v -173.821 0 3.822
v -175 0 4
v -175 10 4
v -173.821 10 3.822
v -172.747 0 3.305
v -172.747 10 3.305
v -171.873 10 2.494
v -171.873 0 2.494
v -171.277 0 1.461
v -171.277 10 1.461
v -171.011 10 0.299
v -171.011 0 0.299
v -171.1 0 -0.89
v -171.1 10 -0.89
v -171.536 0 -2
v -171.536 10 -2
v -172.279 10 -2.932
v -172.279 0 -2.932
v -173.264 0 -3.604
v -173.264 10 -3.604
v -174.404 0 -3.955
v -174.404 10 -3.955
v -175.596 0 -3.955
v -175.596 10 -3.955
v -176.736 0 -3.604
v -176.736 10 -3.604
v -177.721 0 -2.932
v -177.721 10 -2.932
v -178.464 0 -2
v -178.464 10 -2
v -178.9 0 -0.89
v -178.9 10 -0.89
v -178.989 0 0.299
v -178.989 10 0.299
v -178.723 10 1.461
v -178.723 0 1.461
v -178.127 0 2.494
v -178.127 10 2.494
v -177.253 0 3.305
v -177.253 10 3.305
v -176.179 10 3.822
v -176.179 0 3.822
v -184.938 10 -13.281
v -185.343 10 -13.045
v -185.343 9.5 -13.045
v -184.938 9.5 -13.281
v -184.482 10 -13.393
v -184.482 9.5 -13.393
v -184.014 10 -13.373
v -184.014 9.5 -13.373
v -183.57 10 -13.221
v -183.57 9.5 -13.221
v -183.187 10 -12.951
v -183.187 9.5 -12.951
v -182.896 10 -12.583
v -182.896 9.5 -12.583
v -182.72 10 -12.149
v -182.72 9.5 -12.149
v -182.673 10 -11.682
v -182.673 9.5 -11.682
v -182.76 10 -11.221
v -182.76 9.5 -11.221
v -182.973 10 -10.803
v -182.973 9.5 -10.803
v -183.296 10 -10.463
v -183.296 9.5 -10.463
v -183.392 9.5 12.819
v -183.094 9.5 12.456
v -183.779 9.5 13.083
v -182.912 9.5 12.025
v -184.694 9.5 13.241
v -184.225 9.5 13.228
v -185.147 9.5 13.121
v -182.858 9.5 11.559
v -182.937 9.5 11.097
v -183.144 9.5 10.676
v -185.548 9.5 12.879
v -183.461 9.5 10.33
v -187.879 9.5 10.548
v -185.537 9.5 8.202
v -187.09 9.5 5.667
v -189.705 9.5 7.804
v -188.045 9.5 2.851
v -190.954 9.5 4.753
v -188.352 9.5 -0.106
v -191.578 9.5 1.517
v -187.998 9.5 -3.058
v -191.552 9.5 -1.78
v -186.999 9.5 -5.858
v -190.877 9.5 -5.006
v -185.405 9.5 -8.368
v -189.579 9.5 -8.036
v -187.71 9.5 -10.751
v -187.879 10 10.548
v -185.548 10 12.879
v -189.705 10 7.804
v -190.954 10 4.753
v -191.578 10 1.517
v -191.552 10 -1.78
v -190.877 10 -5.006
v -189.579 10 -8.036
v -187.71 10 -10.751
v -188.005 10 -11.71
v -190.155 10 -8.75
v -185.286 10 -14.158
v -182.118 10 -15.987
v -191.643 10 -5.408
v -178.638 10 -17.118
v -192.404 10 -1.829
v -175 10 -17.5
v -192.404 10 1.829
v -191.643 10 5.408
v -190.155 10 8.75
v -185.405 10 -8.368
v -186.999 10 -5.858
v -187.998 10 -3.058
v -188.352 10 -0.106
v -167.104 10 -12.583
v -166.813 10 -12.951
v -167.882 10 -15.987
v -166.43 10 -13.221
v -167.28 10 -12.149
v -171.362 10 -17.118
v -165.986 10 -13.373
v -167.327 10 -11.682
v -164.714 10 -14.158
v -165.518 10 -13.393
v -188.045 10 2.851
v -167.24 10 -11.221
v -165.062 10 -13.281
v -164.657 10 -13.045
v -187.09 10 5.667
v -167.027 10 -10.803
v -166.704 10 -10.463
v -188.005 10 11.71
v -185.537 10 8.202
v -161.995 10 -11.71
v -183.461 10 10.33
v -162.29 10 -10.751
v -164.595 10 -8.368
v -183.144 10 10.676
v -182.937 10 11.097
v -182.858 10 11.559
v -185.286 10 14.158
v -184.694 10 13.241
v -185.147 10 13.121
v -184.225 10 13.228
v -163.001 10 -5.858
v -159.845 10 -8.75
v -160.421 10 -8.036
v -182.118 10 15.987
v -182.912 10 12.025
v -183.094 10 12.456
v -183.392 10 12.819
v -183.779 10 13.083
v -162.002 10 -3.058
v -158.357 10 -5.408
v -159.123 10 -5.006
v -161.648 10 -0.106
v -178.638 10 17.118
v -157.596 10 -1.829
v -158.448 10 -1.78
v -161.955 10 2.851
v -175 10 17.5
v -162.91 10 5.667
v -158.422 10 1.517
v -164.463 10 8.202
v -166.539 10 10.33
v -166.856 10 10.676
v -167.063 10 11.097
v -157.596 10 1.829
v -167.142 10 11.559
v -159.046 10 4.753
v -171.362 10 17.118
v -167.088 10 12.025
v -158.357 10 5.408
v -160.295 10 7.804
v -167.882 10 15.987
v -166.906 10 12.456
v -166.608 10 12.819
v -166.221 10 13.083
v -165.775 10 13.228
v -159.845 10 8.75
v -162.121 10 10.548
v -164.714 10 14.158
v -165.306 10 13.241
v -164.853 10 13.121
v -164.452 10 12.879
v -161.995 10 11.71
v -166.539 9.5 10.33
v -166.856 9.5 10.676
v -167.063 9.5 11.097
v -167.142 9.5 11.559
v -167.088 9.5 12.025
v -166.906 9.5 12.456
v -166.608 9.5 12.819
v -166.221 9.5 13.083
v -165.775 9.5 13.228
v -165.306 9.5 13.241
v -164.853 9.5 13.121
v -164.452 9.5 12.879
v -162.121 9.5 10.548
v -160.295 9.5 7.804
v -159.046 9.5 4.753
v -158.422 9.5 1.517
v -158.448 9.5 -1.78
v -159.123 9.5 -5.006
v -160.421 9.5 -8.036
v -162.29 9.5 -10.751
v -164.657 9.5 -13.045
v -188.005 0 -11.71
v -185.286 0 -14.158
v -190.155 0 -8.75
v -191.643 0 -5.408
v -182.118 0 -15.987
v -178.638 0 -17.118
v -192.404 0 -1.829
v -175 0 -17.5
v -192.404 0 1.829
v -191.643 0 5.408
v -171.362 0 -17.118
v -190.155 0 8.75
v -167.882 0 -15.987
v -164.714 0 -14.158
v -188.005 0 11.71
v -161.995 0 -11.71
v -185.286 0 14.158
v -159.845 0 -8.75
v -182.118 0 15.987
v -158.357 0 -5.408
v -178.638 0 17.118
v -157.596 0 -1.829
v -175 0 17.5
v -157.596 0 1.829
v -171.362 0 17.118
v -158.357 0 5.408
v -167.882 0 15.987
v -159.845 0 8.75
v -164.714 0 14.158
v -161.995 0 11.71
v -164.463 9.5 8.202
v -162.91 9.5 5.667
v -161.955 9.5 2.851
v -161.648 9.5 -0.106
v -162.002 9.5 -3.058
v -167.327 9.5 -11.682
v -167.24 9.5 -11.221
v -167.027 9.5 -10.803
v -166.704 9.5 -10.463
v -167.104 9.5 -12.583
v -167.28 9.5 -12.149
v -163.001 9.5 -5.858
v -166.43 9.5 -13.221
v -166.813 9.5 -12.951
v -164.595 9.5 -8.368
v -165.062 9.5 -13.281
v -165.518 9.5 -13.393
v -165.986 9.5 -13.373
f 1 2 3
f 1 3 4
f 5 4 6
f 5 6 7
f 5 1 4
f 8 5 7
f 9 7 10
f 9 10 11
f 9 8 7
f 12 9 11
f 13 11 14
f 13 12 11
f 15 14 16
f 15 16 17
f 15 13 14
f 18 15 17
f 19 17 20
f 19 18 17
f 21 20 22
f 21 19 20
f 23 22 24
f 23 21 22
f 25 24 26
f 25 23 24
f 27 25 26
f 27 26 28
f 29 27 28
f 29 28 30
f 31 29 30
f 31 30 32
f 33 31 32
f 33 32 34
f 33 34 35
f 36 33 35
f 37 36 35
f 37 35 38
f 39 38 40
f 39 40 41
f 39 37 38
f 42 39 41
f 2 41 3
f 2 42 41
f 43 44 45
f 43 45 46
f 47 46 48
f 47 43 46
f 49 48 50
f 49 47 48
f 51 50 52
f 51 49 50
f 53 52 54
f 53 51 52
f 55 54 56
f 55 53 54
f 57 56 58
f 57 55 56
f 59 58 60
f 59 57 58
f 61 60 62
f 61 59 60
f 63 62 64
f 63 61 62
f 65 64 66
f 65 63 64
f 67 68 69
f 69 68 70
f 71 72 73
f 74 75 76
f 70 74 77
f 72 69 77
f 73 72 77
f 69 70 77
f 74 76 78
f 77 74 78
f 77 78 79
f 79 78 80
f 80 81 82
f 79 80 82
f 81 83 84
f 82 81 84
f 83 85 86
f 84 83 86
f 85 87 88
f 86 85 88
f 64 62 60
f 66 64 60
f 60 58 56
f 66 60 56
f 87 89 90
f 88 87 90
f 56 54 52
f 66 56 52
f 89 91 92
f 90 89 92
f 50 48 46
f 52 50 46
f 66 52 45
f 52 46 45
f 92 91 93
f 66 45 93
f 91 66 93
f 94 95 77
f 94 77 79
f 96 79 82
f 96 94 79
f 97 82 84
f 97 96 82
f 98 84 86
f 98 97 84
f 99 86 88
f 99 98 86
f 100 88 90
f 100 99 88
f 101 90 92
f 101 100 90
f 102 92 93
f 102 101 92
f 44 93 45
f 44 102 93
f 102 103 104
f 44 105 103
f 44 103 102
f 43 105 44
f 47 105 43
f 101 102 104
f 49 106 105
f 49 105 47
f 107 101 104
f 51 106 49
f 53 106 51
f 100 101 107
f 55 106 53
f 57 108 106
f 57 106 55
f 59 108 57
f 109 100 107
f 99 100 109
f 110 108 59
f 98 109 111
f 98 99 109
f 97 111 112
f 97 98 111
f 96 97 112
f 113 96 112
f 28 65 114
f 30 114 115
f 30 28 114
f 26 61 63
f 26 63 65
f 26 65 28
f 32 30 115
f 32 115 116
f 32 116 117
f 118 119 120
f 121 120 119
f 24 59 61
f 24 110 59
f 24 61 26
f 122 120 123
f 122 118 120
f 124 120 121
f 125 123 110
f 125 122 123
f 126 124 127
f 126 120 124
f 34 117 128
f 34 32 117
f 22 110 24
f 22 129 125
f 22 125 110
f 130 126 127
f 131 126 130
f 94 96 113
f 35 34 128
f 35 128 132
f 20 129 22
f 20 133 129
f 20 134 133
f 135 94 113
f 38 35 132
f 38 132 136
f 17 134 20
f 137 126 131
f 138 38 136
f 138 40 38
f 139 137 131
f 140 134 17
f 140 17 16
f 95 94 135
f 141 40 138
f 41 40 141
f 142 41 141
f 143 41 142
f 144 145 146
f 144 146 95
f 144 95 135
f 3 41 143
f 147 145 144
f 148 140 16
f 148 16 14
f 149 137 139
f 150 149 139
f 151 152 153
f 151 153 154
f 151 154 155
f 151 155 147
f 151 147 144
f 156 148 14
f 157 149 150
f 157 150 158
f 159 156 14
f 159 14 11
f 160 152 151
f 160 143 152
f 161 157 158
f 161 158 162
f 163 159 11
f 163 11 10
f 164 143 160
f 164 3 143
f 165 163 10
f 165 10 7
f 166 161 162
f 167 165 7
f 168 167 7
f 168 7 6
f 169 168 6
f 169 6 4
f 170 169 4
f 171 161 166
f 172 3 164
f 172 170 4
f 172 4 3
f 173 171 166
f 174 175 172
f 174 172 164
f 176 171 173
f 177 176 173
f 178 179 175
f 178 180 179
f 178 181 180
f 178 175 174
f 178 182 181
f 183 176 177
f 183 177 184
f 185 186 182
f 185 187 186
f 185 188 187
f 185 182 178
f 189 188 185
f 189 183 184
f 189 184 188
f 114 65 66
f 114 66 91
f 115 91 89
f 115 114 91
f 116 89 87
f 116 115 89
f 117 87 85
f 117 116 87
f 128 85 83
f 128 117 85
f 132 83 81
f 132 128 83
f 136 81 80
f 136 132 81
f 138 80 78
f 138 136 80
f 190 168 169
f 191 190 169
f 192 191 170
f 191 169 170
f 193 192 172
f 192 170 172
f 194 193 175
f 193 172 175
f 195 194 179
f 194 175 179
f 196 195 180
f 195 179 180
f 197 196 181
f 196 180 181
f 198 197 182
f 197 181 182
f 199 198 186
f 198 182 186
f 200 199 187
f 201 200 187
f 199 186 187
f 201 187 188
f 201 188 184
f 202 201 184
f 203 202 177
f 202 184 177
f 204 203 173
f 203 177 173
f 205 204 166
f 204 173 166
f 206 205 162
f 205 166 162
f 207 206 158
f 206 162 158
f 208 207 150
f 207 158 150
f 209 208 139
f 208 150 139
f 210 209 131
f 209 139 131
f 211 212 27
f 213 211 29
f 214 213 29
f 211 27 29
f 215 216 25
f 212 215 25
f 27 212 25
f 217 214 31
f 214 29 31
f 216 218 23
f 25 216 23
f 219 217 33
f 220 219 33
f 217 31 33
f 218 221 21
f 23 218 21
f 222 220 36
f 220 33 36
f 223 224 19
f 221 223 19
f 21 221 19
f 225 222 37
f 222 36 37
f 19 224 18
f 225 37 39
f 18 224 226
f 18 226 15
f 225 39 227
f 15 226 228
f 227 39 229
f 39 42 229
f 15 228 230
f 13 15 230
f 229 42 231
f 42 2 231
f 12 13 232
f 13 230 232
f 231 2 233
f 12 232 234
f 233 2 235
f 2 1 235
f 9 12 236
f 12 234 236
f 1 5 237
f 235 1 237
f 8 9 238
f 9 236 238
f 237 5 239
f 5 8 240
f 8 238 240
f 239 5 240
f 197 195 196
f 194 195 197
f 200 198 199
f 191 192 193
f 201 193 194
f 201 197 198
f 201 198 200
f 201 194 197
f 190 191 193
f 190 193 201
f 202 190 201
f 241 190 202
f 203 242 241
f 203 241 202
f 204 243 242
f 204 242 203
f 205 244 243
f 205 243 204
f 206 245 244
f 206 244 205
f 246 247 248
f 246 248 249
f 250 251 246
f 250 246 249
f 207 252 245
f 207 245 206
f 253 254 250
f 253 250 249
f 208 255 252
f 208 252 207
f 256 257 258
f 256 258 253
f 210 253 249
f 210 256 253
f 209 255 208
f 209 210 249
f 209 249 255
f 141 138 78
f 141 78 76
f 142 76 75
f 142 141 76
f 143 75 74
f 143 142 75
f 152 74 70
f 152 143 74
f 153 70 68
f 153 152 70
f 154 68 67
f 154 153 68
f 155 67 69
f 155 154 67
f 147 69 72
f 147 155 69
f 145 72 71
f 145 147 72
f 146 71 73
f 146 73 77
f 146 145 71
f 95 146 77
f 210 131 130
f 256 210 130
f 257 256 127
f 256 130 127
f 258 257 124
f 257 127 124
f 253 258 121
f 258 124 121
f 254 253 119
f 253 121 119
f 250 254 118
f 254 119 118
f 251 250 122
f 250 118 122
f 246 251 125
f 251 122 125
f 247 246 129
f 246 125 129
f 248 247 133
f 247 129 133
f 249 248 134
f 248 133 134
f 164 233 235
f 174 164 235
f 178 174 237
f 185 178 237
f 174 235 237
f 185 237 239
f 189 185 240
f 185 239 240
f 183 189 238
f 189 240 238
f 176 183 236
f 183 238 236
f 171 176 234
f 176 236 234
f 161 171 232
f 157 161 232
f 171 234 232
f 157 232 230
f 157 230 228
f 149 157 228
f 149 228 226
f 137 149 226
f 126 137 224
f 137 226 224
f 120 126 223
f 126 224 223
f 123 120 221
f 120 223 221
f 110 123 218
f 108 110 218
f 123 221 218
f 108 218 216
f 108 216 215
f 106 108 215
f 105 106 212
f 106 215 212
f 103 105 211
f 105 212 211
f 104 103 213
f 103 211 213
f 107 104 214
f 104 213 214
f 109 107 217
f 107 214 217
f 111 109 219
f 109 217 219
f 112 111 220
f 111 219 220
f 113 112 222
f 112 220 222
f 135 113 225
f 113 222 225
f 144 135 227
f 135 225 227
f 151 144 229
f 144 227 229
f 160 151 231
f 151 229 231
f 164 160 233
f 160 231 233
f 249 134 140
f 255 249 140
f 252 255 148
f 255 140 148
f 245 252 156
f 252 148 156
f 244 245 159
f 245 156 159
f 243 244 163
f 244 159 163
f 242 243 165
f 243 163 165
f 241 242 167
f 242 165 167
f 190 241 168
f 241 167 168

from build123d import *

# Parameters (mm, degrees)
SKETCH_3_R          = 17.5
SKETCH_3_R_2        = 4
EXTRUDE_1_DEPTH     = 10
CUT_EXTRUDE_1_DEPTH = 0.5


with BuildPart() as part:
    # 草图3 → 凸台-拉伸1 (new body)
    with BuildSketch(Plane(origin=(0, 0, 0), x_dir=(1, 0, 0), z_dir=(0, 1, 0))):
        with Locations(Location((-175, 0, 0), (0, 0, 270))):
            Circle(SKETCH_3_R)
        with Locations(Location((-175, 0, 0), (0, 0, 270))):
            Circle(SKETCH_3_R_2, mode=Mode.SUBTRACT)
    extrude(amount=EXTRUDE_1_DEPTH)

    # 草图5 → 切除-拉伸1 (cut)
    with BuildSketch(Plane(origin=(0, 10, 0), x_dir=(1, 0, 0), z_dir=(0, 1, 0))):
        with BuildLine():
            ThreePointArc((-164.451502199, -12.878997225), (-158.353020286, 0.132067312), (-164.657165804, 13.044736723))
            ThreePointArc((-164.657165804, 13.044736723), (-166.97169342, 12.777345636), (-166.704302333, 10.46281802))
            ThreePointArc((-166.704302333, 10.46281802), (-161.647923755, 0.105927492), (-166.539345315, -10.32988301))
            ThreePointArc((-166.539345315, -10.32988301), (-166.769980864, -12.648361675), (-164.451502199, -12.878997225))
        make_face()
        with BuildLine():
            ThreePointArc((-185.548497801, -12.878997225), (-191.646979714, 0.132067312), (-185.342834196, 13.044736723))
            ThreePointArc((-185.342834196, 13.044736723), (-183.02830658, 12.777345636), (-183.295697667, 10.46281802))
            ThreePointArc((-183.295697667, 10.46281802), (-188.352076245, 0.105927492), (-183.460654685, -10.32988301))
            ThreePointArc((-183.460654685, -10.32988301), (-183.230019136, -12.648361675), (-185.548497801, -12.878997225))
        make_face()
    extrude(amount=-CUT_EXTRUDE_1_DEPTH, mode=Mode.SUBTRACT)


solid = part.part
